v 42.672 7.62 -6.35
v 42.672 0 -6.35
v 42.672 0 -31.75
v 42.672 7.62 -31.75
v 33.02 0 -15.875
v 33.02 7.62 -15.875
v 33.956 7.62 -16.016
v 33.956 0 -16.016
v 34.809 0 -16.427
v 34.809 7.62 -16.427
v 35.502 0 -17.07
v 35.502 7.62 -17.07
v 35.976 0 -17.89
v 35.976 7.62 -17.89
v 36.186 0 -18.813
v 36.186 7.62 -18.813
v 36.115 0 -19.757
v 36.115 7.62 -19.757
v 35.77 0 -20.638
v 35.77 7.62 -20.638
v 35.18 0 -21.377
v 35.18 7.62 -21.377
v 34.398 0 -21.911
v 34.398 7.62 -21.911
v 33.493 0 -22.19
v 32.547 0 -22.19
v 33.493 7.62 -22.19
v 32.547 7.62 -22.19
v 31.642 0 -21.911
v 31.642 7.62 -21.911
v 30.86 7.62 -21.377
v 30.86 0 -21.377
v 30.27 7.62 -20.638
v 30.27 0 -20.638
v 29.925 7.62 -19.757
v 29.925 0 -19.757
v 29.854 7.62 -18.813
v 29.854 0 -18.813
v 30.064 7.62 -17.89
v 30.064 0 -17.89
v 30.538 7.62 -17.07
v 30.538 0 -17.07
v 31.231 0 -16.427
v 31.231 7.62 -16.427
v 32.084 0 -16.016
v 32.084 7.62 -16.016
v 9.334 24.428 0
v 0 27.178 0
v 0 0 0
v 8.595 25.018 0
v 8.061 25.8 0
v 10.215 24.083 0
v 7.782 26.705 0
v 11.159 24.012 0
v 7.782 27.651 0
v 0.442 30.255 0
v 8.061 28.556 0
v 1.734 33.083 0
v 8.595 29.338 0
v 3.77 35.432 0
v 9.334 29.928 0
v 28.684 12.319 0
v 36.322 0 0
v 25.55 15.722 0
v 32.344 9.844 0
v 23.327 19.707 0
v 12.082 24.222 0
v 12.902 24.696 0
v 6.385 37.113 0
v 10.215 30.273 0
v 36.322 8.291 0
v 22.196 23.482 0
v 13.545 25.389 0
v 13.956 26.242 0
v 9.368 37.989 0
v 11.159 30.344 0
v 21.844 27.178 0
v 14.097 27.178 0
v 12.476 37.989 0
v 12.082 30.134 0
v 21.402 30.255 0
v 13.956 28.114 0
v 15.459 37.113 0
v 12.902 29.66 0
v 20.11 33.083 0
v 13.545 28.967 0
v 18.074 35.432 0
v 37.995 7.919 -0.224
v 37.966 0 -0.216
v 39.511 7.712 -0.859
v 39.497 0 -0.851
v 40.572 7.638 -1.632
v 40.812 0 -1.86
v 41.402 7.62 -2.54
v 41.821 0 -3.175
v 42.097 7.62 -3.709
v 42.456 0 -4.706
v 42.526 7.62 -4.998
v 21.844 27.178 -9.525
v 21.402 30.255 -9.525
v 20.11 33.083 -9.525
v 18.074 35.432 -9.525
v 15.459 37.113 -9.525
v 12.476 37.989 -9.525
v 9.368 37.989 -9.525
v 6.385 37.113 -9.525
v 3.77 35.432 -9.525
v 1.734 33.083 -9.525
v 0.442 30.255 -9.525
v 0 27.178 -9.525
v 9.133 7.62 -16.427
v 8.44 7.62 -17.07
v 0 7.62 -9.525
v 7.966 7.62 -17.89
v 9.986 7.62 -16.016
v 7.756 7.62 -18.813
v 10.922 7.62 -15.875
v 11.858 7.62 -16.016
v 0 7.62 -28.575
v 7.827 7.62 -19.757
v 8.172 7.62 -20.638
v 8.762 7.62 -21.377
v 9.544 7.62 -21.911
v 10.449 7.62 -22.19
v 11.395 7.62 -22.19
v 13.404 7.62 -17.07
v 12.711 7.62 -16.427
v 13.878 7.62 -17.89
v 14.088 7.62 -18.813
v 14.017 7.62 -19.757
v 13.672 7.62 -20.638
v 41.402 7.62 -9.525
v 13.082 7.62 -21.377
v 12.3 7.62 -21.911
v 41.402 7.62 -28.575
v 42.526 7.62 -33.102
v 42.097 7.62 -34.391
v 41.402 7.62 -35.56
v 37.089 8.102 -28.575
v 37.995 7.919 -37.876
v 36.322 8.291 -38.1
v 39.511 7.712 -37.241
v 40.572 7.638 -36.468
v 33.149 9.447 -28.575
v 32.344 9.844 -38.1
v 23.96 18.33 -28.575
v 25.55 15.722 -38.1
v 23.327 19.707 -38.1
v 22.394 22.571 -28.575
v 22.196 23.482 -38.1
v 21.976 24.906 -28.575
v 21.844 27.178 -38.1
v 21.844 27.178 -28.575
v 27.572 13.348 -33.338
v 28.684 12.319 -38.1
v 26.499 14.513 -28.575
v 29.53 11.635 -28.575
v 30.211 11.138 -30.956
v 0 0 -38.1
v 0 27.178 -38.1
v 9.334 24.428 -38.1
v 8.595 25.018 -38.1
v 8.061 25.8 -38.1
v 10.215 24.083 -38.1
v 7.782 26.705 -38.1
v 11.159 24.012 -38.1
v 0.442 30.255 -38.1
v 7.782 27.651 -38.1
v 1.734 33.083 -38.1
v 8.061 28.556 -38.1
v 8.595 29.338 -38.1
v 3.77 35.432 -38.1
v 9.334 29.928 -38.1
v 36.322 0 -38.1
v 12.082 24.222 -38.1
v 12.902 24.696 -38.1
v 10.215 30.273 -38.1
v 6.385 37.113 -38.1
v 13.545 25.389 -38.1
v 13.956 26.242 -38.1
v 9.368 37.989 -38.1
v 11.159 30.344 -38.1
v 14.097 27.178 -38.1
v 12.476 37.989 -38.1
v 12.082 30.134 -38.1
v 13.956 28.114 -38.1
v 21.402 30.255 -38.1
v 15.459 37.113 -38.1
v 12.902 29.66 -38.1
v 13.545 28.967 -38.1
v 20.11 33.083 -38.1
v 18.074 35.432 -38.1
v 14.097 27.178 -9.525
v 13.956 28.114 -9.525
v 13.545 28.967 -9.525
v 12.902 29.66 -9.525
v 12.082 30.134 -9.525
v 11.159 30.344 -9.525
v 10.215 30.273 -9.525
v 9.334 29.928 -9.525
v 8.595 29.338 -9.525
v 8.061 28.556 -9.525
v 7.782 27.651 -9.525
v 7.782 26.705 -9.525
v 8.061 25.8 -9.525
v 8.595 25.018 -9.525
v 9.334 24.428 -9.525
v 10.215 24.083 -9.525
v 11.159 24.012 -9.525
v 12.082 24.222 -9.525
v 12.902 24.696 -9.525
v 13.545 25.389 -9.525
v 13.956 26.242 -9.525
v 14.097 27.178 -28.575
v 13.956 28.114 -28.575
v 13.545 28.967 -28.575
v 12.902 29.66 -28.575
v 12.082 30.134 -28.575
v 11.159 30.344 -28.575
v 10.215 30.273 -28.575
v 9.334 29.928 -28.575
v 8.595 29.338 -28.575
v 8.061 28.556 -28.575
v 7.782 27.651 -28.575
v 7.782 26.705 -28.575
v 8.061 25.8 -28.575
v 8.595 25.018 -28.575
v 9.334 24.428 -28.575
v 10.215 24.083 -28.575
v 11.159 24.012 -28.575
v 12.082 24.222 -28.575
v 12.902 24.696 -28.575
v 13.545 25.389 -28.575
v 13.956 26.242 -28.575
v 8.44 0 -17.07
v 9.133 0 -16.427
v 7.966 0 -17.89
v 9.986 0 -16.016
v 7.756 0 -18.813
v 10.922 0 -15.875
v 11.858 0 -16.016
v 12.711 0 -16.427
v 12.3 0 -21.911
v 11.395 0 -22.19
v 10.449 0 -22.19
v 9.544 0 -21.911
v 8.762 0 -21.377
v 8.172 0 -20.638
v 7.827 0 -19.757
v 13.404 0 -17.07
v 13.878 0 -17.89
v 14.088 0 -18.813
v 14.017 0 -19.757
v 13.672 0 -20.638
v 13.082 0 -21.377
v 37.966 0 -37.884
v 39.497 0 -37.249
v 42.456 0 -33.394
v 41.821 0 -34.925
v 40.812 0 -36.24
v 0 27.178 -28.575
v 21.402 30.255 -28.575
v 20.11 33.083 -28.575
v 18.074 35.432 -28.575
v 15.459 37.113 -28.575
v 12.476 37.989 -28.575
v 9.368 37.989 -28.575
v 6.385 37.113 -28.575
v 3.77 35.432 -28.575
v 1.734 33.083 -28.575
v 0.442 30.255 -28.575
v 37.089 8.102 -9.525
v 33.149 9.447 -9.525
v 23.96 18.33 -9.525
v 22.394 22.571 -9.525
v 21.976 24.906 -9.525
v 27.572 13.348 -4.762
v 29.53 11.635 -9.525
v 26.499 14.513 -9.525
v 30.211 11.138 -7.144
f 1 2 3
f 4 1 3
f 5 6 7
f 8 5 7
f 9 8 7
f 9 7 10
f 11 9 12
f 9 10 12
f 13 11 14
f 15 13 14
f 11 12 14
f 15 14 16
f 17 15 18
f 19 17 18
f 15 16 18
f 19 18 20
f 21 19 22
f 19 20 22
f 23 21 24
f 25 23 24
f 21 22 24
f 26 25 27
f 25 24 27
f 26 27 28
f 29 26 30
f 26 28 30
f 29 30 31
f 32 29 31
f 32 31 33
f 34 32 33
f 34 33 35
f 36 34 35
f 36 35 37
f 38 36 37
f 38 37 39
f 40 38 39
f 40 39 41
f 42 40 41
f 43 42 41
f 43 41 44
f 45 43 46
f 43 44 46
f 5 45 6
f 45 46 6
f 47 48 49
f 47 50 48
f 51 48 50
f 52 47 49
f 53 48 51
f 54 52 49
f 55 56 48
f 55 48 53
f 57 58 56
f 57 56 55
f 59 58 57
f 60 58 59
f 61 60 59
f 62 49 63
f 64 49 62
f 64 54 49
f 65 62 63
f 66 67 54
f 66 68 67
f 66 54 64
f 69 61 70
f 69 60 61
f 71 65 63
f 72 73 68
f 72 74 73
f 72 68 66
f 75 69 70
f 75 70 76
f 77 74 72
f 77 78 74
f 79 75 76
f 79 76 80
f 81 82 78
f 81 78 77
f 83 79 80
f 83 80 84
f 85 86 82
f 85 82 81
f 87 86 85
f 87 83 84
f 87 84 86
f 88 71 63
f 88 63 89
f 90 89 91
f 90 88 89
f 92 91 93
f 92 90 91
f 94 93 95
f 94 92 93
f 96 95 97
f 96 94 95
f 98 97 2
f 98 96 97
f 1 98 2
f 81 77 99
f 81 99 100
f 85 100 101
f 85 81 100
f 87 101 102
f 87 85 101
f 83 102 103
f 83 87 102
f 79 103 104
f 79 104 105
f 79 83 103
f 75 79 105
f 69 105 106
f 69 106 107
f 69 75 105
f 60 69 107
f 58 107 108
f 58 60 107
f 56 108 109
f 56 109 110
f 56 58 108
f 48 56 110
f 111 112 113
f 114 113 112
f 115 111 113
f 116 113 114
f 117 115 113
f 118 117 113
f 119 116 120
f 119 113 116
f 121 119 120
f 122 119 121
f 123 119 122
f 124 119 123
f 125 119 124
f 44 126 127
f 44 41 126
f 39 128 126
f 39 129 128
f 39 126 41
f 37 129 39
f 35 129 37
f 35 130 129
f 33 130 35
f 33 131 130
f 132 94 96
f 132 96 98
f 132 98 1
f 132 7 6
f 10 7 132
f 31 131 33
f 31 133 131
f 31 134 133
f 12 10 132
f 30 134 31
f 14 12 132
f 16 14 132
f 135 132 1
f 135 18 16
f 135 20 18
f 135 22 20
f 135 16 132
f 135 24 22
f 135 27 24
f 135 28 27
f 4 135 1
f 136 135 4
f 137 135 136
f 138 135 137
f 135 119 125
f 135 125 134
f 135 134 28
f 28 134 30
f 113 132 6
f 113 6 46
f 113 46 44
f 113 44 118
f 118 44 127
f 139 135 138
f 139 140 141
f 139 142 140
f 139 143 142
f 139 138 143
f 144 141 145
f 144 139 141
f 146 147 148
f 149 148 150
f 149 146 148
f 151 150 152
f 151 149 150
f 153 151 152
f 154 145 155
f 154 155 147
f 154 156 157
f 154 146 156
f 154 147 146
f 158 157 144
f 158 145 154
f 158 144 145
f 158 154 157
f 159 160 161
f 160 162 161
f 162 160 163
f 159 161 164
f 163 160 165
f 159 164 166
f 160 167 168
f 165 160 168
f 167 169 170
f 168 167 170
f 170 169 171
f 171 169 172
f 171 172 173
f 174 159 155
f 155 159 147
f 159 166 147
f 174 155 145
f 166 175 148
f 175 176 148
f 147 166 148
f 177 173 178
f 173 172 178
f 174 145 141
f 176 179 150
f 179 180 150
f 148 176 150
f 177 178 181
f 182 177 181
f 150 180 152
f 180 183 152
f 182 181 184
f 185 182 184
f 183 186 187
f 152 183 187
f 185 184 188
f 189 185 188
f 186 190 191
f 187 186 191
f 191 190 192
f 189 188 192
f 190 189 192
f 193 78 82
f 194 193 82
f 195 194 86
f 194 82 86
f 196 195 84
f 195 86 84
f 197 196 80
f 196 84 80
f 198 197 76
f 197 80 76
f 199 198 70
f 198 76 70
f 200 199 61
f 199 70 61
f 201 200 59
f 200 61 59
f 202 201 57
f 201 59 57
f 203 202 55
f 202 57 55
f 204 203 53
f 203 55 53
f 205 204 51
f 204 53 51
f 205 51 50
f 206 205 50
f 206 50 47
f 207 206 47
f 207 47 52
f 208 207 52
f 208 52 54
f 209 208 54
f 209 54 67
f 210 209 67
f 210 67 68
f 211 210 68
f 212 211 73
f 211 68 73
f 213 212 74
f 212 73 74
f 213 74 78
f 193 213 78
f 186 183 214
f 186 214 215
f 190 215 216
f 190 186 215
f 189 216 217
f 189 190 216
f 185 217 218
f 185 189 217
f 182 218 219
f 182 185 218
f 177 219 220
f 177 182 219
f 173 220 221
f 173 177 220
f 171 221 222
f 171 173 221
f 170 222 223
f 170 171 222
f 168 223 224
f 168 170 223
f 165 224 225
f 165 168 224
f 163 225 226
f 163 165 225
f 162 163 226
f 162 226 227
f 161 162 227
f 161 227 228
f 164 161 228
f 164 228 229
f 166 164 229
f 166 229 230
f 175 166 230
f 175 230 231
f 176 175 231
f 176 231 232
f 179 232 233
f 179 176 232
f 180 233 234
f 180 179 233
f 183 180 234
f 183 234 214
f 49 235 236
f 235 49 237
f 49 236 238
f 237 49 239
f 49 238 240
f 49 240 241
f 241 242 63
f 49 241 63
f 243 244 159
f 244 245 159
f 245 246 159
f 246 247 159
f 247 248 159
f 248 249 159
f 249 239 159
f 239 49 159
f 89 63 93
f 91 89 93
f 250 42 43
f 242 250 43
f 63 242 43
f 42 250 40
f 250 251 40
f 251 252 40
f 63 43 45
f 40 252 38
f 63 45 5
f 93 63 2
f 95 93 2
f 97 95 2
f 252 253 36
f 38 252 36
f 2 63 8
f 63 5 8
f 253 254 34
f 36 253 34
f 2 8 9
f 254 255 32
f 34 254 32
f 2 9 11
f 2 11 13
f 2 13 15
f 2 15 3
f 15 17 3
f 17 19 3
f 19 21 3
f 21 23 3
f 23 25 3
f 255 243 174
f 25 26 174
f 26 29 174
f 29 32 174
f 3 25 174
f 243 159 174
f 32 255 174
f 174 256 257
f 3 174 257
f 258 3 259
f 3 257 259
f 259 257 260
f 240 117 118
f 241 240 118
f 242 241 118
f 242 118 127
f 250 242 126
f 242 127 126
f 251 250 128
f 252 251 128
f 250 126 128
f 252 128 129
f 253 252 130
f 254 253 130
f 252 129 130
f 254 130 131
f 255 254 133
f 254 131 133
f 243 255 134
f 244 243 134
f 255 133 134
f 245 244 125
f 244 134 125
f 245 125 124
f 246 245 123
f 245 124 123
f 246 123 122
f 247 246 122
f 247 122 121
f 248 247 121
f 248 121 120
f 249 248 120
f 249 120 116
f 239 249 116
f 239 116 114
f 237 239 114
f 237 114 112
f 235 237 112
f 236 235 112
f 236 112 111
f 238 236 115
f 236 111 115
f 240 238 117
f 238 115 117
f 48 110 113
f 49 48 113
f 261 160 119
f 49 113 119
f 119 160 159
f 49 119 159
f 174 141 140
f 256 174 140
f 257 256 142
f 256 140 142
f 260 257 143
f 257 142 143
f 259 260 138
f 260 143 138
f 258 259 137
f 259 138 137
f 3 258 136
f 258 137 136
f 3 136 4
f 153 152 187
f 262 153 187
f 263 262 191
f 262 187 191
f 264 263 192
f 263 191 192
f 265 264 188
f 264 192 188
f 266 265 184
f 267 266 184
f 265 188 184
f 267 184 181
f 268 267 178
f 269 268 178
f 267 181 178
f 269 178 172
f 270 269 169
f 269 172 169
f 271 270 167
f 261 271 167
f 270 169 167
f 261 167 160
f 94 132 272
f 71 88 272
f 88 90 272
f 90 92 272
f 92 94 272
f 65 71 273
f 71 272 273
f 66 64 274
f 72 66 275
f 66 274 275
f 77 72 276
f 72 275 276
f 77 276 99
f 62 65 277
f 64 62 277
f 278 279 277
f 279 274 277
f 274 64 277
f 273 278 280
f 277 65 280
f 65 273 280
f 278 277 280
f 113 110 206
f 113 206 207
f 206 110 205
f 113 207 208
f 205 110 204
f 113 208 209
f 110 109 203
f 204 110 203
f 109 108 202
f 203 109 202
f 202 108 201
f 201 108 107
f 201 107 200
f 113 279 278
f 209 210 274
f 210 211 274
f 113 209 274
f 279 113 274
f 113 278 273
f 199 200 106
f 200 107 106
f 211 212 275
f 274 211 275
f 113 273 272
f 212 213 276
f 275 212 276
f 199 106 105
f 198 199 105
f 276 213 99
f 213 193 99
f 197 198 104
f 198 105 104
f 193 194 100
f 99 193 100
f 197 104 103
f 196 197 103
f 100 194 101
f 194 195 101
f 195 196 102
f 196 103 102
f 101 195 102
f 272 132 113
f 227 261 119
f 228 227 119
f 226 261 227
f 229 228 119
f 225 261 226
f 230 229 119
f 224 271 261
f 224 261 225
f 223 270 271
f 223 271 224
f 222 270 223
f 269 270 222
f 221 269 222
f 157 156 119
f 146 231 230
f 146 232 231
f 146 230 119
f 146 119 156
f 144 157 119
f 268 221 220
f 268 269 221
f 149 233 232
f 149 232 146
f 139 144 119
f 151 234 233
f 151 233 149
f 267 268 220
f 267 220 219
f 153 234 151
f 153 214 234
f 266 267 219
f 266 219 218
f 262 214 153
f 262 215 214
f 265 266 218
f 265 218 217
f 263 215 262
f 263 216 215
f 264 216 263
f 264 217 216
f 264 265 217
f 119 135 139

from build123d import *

# Parameters (mm, degrees)
SKETCH1_W           = 42.672
SKETCH1_H           = 38.1
BOSS_EXTRUDE1_DEPTH = 7.62
SKETCH3_R           = 3.175
CUT_EXTRUDE1_DEPTH  = 7.62
SKETCH4_R           = 10.922
SKETCH4_R_2         = 3.175
BOSS_EXTRUDE2_DEPTH = 9.525
FILLET1_START       = -9.525
FILLET1_DEPTH       = 9.525
FILLET2_R           = 6.35
FILLET3_R           = 6.35


with BuildPart() as part:
    # Sketch1 → Boss-Extrude1 (new body)
    with BuildSketch(Plane(origin=(0, 0, 0), x_dir=(1, 0, 0), z_dir=(0, 1, 0))):
        with Locations((21.336, 19.05)):
            Rectangle(SKETCH1_W, SKETCH1_H)
    extrude(amount=BOSS_EXTRUDE1_DEPTH)

    # Sketch3 → Cut-Extrude1 (cut)
    with BuildSketch(Plane(origin=(0, 7.62, 0), x_dir=(-1, 0, 0), z_dir=(0, 1, 0))):
        with Locations(Location((-10.922, -19.05, 0), (0, 0, 90))):
            Circle(SKETCH3_R)
        with Locations(Location((-33.02, -19.05, 0), (0, 0, 90))):
            Circle(SKETCH3_R)
    extrude(amount=-CUT_EXTRUDE1_DEPTH, mode=Mode.SUBTRACT)

    # Sketch4 → Boss-Extrude2 (add)
    # profile 1 of 2: a face of its own
    with BuildSketch(Plane.XY):
        with BuildLine():
            Line((0, 27.178), (0, 7.62))
            Line((0, 7.62), (21.844, 7.62))
            Line((21.844, 7.62), (21.844, 27.178))
            ThreePointArc((21.844, 27.178), (10.922, 16.256), (0, 27.178))
        make_face()
    # profile 2 of 2: a face of its own
    with BuildSketch(Plane.XY):
        with Locations((10.922, 27.178)):
            Circle(SKETCH4_R)
        with Locations((10.922, 27.178)):
            Circle(SKETCH4_R_2, mode=Mode.SUBTRACT)
    boss_extrude2 = extrude(amount=-BOSS_EXTRUDE2_DEPTH)

    # Fillet1: read off the stored shape, not the designer's step
    # Fillet1 outline → Fillet1 (add)
    with BuildSketch(Plane.XY.offset(FILLET1_START)):
        with BuildLine():
            Line((21.844, 7.62), (41.402, 7.62))
            add(Edge.make_bspline(
                [(41.402, 7.62), (21.844, 7.62), (21.844, 27.178)],
                knots=[0, 0, 0, 1, 1, 1], degree=2, weights=[1, 0.707106781, 1]))
            Line((21.844, 27.178), (21.844, 7.62))
        make_face()
    fillet1 = extrude(amount=FILLET1_DEPTH)

    # Fillet2
    fillet2_edges = [part.edges().sort_by_distance(p)[0] for p in [
        (42.672, 3.81, 0),
    ]]
    fillet(fillet2_edges, radius=FILLET2_R)

    # Mirror2: Boss-Extrude2, Fillet1 across plane
    add(boss_extrude2.mirror(Plane.XY.offset(-19.05)))
    add(fillet1.mirror(Plane.XY.offset(-19.05)))

    # Fillet3
    fillet3_edges = [part.edges().sort_by_distance(p)[0] for p in [
        (42.672, 3.81, -38.1),
    ]]
    fillet(fillet3_edges, radius=FILLET3_R)


solid = part.part
